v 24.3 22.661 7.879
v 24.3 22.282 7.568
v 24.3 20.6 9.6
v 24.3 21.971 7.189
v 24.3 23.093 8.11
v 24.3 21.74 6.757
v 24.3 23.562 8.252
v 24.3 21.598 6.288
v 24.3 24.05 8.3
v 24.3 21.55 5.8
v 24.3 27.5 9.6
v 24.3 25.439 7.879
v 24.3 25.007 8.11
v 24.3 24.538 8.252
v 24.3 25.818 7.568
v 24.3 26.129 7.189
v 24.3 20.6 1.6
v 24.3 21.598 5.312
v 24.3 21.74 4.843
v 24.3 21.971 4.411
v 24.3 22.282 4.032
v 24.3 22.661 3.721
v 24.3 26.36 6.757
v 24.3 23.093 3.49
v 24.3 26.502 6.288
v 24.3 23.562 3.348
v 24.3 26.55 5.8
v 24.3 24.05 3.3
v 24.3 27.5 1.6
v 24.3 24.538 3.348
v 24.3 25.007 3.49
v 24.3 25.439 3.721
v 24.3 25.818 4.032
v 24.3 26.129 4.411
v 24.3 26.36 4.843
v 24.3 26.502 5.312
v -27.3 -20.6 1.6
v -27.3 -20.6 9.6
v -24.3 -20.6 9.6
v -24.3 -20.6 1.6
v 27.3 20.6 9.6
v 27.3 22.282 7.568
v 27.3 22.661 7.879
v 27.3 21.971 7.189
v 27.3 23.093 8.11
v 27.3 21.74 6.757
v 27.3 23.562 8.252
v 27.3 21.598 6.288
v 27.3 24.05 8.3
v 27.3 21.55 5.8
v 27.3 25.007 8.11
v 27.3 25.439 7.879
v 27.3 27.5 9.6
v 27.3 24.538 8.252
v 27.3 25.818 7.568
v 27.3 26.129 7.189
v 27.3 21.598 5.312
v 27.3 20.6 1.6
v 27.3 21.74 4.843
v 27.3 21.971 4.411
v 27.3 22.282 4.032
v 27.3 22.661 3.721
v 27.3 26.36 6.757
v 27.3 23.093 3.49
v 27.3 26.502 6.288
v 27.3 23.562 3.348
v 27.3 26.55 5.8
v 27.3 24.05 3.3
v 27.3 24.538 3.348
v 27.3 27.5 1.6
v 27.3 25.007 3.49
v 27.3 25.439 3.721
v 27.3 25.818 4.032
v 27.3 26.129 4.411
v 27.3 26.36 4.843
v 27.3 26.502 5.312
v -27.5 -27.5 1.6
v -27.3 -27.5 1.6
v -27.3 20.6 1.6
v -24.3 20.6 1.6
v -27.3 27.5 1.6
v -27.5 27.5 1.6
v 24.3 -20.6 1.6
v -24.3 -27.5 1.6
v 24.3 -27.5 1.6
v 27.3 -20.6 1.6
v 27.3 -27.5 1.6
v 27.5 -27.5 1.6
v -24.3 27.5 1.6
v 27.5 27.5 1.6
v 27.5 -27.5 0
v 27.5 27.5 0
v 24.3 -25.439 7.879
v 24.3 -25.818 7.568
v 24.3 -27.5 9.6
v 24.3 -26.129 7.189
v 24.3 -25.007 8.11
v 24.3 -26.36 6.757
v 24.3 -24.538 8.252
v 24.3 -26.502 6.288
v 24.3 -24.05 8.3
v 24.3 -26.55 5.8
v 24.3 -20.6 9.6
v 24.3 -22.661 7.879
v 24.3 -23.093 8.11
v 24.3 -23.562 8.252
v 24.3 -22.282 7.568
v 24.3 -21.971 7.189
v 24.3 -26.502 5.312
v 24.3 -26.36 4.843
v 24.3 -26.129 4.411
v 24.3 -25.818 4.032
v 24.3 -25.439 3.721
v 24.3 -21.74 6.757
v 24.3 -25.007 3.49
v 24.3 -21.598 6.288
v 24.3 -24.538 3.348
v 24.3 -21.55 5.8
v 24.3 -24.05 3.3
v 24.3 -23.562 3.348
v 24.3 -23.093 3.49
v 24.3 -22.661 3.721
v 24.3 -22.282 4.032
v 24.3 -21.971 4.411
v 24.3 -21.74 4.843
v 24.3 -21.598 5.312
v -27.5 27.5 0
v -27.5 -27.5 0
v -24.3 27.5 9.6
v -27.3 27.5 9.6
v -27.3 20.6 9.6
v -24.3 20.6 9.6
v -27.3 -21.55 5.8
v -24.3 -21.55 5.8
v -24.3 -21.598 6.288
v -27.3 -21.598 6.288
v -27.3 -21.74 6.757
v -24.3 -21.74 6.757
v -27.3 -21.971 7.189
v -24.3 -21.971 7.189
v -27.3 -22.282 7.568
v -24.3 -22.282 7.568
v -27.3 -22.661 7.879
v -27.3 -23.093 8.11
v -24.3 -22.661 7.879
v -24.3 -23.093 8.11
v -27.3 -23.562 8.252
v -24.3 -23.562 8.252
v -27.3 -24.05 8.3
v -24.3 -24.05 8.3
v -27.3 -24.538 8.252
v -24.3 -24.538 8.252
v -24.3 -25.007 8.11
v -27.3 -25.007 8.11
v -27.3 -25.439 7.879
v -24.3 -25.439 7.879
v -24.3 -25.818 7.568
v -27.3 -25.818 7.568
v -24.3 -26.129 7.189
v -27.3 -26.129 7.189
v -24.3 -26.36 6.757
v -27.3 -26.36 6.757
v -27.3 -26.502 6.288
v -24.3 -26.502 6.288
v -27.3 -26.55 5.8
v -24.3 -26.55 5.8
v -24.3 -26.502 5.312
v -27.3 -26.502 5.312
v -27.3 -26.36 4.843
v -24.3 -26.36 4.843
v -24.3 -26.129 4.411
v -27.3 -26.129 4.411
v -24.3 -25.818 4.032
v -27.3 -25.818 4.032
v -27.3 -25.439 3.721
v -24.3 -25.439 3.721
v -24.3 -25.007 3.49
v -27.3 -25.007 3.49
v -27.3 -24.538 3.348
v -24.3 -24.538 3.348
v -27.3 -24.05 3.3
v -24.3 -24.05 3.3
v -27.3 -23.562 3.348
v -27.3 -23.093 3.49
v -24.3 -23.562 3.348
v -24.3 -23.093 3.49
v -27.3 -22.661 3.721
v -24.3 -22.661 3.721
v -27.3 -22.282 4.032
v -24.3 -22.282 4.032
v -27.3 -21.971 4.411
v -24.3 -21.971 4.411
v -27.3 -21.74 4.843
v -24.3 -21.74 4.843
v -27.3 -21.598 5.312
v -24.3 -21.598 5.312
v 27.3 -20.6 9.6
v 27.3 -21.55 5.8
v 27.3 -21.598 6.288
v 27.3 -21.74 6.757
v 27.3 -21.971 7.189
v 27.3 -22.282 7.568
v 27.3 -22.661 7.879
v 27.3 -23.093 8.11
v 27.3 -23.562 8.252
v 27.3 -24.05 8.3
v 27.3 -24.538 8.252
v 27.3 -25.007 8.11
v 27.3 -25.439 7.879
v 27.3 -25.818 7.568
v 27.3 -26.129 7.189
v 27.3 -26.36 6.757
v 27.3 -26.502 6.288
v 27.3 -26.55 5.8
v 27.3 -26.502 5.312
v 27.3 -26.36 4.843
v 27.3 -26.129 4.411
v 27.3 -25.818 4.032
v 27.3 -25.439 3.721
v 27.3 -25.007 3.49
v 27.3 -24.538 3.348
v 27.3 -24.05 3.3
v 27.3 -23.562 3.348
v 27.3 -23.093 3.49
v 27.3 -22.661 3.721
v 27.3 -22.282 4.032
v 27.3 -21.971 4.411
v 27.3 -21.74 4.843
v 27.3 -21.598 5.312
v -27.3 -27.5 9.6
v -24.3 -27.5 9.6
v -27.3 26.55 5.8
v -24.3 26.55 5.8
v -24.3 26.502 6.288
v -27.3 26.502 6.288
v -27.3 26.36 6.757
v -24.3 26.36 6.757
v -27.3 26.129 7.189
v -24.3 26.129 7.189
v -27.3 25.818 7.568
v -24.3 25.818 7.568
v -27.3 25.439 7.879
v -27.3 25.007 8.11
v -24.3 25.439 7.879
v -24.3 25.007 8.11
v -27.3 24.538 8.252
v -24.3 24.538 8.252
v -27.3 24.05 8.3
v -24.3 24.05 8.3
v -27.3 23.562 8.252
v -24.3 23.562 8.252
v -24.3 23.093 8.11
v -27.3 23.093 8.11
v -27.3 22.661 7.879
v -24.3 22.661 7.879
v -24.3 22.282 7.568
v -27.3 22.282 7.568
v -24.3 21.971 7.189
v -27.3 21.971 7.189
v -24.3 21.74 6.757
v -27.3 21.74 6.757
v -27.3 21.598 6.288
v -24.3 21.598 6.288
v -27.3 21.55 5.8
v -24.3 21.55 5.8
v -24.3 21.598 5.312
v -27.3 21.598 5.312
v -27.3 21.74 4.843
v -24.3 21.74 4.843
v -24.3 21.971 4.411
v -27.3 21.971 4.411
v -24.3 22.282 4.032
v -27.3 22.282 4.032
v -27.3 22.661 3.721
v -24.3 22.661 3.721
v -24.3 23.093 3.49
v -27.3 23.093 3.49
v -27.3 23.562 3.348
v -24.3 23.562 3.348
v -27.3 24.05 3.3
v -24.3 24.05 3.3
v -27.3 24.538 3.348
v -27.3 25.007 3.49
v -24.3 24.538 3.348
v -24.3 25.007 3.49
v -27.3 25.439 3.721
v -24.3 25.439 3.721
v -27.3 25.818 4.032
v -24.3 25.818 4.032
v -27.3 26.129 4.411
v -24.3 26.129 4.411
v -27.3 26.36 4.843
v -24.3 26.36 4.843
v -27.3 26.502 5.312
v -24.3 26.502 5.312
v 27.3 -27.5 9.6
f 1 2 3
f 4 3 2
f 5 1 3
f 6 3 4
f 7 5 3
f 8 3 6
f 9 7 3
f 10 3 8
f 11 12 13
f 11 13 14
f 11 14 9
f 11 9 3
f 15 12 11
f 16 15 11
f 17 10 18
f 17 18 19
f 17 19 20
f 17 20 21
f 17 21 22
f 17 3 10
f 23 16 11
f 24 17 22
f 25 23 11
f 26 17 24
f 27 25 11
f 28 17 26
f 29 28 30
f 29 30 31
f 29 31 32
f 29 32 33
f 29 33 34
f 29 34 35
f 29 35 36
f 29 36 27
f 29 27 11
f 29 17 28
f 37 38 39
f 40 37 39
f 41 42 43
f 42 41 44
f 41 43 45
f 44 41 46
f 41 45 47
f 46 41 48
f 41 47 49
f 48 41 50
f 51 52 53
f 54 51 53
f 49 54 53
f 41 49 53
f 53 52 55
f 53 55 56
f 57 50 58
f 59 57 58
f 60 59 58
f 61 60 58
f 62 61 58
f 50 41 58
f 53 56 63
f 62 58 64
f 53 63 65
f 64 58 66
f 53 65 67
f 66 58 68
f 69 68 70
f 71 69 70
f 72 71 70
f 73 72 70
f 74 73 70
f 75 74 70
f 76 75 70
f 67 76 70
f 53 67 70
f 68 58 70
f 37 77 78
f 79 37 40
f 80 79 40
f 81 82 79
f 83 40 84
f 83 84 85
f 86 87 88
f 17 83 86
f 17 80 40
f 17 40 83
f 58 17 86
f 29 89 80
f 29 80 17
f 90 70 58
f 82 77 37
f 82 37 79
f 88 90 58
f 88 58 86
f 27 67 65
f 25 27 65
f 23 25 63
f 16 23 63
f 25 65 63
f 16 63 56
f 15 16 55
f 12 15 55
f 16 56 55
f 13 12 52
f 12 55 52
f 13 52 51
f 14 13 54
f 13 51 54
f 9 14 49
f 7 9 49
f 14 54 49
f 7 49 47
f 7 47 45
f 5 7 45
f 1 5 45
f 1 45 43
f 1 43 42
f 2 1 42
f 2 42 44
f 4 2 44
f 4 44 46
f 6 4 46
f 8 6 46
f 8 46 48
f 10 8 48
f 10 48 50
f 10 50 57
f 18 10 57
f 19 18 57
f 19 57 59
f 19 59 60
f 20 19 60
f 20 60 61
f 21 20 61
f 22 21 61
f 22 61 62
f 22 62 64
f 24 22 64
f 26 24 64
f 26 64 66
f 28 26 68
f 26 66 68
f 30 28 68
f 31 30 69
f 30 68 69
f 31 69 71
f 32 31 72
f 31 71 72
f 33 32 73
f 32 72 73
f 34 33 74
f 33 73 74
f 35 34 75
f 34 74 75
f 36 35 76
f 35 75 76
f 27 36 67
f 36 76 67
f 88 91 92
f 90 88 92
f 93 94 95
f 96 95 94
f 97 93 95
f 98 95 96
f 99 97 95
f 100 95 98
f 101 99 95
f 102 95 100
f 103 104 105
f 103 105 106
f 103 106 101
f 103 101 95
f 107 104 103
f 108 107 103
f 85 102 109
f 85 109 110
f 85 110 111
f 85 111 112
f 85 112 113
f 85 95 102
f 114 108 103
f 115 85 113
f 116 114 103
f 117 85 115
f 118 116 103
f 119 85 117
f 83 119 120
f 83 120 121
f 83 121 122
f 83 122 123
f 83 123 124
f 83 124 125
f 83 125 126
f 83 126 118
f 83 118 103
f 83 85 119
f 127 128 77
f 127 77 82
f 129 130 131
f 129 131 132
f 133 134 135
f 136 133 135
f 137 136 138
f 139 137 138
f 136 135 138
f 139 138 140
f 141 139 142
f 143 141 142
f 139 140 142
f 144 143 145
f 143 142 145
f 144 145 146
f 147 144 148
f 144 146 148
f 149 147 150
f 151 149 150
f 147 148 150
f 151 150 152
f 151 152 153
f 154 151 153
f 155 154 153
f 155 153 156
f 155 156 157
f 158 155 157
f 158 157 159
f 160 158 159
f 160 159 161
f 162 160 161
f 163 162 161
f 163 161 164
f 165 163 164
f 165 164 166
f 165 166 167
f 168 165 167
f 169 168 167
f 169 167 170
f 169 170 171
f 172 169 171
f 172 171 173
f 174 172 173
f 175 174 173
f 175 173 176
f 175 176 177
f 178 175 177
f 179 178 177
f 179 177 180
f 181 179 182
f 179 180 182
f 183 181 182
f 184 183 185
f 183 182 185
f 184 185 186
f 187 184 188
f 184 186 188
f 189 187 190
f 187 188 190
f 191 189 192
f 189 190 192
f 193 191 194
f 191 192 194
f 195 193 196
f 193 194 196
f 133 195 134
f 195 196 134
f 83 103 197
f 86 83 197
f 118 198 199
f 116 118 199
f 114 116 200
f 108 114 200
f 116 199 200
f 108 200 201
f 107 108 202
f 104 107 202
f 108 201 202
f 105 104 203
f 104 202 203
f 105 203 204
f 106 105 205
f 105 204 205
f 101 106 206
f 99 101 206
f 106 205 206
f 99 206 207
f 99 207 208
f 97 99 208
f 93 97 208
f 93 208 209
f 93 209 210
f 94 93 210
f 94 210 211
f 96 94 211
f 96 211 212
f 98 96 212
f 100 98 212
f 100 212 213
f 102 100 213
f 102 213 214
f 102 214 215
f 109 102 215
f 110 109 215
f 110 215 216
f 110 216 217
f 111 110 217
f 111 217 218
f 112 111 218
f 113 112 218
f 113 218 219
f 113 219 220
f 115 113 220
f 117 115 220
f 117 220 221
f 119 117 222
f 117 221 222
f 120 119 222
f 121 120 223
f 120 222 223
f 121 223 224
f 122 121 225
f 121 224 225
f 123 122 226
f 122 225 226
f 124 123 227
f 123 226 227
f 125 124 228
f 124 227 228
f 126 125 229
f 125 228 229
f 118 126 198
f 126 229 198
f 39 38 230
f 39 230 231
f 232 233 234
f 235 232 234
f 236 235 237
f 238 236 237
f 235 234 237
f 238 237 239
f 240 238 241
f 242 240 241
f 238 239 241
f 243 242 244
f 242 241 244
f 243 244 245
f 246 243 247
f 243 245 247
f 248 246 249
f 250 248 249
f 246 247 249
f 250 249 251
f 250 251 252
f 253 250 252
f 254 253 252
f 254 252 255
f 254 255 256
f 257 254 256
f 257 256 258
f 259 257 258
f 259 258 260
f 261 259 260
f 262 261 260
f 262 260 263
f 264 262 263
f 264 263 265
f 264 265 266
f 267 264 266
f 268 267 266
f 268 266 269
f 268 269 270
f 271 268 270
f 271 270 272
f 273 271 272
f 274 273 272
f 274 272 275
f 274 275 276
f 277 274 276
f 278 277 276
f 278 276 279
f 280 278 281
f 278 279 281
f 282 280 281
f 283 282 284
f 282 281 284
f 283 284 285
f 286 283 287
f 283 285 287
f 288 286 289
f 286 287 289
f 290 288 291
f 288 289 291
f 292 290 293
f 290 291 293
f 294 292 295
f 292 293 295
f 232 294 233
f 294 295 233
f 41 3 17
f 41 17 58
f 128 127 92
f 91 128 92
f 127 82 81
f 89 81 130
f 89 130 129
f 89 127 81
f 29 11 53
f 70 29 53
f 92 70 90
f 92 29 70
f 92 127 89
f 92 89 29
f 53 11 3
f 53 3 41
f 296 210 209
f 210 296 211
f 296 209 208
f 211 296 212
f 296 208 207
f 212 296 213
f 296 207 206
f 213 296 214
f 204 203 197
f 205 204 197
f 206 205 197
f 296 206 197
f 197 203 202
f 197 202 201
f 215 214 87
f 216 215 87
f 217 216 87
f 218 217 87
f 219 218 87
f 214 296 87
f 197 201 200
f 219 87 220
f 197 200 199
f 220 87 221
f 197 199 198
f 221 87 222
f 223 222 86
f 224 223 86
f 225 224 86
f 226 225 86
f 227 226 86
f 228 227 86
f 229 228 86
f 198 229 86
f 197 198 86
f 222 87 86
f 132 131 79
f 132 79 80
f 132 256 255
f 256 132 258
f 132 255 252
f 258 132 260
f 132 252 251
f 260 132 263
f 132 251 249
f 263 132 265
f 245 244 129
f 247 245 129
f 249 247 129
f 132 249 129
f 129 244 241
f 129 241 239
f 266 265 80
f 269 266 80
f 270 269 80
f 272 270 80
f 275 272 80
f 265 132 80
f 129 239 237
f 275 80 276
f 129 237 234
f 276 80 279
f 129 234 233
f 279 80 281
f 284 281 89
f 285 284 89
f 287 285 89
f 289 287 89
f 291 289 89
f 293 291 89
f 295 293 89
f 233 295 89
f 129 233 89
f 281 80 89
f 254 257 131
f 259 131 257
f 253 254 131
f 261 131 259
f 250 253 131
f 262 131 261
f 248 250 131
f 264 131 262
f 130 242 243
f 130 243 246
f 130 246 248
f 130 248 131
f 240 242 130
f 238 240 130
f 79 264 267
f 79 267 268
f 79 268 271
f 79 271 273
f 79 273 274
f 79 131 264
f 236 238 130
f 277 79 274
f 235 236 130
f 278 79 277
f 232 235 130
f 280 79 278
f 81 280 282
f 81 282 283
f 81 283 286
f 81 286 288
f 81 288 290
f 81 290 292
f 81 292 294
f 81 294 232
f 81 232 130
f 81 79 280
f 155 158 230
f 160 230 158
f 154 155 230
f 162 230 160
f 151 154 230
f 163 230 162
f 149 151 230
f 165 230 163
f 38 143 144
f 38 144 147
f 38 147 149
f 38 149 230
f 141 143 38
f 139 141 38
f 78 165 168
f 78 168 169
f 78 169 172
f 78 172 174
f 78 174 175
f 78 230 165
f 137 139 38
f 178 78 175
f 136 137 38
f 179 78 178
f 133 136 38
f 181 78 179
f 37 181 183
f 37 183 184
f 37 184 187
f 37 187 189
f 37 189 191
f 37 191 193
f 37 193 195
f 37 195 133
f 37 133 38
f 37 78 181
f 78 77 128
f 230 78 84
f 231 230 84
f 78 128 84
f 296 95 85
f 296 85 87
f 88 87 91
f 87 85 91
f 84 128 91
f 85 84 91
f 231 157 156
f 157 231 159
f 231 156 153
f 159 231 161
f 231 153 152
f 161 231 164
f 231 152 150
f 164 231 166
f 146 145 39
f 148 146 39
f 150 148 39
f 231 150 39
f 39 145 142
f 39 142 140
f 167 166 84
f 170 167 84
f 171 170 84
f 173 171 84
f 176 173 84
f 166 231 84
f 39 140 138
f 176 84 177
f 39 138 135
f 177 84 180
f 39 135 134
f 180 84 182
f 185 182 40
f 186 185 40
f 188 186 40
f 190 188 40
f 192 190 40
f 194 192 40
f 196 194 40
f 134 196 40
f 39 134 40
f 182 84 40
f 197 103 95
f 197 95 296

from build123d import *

# Parameters (mm, degrees)
F0_W     = 55
F0_H     = 55
F1_DEPTH = 1.6
F2_W     = 3
F2_H     = 6.9
F3_DEPTH = 8
F4_R     = 2.5
F5_DEPTH = 54.801


with BuildPart() as f1:
    # F0 (on Top) → F1 (new body)
    with BuildSketch(Plane.XY):
        Rectangle(F0_W, F0_H)
    extrude(amount=F1_DEPTH)

    # F2 (on face) → F3 (join)
    with BuildSketch(Plane.XY.offset(1.6)):
        with Locations((25.8, 24.05)):
            Rectangle(F2_W, F2_H)
        with Locations((25.8, -24.05)):
            Rectangle(F2_W, F2_H)
        with Locations((-25.8, -24.05)):
            Rectangle(F2_W, F2_H)
        with Locations((-25.8, 24.05)):
            Rectangle(F2_W, F2_H)
    extrude(amount=F3_DEPTH)

    # F4 (on face) → F5 (cut, through all)
    with BuildSketch(Plane.YZ.offset(27.3)):
        with Locations((24.05, 5.8)):
            Circle(F4_R)
        with Locations((-24.05, 5.8)):
            Circle(F4_R)
    extrude(amount=-F5_DEPTH, mode=Mode.SUBTRACT)


solid = f1.part
